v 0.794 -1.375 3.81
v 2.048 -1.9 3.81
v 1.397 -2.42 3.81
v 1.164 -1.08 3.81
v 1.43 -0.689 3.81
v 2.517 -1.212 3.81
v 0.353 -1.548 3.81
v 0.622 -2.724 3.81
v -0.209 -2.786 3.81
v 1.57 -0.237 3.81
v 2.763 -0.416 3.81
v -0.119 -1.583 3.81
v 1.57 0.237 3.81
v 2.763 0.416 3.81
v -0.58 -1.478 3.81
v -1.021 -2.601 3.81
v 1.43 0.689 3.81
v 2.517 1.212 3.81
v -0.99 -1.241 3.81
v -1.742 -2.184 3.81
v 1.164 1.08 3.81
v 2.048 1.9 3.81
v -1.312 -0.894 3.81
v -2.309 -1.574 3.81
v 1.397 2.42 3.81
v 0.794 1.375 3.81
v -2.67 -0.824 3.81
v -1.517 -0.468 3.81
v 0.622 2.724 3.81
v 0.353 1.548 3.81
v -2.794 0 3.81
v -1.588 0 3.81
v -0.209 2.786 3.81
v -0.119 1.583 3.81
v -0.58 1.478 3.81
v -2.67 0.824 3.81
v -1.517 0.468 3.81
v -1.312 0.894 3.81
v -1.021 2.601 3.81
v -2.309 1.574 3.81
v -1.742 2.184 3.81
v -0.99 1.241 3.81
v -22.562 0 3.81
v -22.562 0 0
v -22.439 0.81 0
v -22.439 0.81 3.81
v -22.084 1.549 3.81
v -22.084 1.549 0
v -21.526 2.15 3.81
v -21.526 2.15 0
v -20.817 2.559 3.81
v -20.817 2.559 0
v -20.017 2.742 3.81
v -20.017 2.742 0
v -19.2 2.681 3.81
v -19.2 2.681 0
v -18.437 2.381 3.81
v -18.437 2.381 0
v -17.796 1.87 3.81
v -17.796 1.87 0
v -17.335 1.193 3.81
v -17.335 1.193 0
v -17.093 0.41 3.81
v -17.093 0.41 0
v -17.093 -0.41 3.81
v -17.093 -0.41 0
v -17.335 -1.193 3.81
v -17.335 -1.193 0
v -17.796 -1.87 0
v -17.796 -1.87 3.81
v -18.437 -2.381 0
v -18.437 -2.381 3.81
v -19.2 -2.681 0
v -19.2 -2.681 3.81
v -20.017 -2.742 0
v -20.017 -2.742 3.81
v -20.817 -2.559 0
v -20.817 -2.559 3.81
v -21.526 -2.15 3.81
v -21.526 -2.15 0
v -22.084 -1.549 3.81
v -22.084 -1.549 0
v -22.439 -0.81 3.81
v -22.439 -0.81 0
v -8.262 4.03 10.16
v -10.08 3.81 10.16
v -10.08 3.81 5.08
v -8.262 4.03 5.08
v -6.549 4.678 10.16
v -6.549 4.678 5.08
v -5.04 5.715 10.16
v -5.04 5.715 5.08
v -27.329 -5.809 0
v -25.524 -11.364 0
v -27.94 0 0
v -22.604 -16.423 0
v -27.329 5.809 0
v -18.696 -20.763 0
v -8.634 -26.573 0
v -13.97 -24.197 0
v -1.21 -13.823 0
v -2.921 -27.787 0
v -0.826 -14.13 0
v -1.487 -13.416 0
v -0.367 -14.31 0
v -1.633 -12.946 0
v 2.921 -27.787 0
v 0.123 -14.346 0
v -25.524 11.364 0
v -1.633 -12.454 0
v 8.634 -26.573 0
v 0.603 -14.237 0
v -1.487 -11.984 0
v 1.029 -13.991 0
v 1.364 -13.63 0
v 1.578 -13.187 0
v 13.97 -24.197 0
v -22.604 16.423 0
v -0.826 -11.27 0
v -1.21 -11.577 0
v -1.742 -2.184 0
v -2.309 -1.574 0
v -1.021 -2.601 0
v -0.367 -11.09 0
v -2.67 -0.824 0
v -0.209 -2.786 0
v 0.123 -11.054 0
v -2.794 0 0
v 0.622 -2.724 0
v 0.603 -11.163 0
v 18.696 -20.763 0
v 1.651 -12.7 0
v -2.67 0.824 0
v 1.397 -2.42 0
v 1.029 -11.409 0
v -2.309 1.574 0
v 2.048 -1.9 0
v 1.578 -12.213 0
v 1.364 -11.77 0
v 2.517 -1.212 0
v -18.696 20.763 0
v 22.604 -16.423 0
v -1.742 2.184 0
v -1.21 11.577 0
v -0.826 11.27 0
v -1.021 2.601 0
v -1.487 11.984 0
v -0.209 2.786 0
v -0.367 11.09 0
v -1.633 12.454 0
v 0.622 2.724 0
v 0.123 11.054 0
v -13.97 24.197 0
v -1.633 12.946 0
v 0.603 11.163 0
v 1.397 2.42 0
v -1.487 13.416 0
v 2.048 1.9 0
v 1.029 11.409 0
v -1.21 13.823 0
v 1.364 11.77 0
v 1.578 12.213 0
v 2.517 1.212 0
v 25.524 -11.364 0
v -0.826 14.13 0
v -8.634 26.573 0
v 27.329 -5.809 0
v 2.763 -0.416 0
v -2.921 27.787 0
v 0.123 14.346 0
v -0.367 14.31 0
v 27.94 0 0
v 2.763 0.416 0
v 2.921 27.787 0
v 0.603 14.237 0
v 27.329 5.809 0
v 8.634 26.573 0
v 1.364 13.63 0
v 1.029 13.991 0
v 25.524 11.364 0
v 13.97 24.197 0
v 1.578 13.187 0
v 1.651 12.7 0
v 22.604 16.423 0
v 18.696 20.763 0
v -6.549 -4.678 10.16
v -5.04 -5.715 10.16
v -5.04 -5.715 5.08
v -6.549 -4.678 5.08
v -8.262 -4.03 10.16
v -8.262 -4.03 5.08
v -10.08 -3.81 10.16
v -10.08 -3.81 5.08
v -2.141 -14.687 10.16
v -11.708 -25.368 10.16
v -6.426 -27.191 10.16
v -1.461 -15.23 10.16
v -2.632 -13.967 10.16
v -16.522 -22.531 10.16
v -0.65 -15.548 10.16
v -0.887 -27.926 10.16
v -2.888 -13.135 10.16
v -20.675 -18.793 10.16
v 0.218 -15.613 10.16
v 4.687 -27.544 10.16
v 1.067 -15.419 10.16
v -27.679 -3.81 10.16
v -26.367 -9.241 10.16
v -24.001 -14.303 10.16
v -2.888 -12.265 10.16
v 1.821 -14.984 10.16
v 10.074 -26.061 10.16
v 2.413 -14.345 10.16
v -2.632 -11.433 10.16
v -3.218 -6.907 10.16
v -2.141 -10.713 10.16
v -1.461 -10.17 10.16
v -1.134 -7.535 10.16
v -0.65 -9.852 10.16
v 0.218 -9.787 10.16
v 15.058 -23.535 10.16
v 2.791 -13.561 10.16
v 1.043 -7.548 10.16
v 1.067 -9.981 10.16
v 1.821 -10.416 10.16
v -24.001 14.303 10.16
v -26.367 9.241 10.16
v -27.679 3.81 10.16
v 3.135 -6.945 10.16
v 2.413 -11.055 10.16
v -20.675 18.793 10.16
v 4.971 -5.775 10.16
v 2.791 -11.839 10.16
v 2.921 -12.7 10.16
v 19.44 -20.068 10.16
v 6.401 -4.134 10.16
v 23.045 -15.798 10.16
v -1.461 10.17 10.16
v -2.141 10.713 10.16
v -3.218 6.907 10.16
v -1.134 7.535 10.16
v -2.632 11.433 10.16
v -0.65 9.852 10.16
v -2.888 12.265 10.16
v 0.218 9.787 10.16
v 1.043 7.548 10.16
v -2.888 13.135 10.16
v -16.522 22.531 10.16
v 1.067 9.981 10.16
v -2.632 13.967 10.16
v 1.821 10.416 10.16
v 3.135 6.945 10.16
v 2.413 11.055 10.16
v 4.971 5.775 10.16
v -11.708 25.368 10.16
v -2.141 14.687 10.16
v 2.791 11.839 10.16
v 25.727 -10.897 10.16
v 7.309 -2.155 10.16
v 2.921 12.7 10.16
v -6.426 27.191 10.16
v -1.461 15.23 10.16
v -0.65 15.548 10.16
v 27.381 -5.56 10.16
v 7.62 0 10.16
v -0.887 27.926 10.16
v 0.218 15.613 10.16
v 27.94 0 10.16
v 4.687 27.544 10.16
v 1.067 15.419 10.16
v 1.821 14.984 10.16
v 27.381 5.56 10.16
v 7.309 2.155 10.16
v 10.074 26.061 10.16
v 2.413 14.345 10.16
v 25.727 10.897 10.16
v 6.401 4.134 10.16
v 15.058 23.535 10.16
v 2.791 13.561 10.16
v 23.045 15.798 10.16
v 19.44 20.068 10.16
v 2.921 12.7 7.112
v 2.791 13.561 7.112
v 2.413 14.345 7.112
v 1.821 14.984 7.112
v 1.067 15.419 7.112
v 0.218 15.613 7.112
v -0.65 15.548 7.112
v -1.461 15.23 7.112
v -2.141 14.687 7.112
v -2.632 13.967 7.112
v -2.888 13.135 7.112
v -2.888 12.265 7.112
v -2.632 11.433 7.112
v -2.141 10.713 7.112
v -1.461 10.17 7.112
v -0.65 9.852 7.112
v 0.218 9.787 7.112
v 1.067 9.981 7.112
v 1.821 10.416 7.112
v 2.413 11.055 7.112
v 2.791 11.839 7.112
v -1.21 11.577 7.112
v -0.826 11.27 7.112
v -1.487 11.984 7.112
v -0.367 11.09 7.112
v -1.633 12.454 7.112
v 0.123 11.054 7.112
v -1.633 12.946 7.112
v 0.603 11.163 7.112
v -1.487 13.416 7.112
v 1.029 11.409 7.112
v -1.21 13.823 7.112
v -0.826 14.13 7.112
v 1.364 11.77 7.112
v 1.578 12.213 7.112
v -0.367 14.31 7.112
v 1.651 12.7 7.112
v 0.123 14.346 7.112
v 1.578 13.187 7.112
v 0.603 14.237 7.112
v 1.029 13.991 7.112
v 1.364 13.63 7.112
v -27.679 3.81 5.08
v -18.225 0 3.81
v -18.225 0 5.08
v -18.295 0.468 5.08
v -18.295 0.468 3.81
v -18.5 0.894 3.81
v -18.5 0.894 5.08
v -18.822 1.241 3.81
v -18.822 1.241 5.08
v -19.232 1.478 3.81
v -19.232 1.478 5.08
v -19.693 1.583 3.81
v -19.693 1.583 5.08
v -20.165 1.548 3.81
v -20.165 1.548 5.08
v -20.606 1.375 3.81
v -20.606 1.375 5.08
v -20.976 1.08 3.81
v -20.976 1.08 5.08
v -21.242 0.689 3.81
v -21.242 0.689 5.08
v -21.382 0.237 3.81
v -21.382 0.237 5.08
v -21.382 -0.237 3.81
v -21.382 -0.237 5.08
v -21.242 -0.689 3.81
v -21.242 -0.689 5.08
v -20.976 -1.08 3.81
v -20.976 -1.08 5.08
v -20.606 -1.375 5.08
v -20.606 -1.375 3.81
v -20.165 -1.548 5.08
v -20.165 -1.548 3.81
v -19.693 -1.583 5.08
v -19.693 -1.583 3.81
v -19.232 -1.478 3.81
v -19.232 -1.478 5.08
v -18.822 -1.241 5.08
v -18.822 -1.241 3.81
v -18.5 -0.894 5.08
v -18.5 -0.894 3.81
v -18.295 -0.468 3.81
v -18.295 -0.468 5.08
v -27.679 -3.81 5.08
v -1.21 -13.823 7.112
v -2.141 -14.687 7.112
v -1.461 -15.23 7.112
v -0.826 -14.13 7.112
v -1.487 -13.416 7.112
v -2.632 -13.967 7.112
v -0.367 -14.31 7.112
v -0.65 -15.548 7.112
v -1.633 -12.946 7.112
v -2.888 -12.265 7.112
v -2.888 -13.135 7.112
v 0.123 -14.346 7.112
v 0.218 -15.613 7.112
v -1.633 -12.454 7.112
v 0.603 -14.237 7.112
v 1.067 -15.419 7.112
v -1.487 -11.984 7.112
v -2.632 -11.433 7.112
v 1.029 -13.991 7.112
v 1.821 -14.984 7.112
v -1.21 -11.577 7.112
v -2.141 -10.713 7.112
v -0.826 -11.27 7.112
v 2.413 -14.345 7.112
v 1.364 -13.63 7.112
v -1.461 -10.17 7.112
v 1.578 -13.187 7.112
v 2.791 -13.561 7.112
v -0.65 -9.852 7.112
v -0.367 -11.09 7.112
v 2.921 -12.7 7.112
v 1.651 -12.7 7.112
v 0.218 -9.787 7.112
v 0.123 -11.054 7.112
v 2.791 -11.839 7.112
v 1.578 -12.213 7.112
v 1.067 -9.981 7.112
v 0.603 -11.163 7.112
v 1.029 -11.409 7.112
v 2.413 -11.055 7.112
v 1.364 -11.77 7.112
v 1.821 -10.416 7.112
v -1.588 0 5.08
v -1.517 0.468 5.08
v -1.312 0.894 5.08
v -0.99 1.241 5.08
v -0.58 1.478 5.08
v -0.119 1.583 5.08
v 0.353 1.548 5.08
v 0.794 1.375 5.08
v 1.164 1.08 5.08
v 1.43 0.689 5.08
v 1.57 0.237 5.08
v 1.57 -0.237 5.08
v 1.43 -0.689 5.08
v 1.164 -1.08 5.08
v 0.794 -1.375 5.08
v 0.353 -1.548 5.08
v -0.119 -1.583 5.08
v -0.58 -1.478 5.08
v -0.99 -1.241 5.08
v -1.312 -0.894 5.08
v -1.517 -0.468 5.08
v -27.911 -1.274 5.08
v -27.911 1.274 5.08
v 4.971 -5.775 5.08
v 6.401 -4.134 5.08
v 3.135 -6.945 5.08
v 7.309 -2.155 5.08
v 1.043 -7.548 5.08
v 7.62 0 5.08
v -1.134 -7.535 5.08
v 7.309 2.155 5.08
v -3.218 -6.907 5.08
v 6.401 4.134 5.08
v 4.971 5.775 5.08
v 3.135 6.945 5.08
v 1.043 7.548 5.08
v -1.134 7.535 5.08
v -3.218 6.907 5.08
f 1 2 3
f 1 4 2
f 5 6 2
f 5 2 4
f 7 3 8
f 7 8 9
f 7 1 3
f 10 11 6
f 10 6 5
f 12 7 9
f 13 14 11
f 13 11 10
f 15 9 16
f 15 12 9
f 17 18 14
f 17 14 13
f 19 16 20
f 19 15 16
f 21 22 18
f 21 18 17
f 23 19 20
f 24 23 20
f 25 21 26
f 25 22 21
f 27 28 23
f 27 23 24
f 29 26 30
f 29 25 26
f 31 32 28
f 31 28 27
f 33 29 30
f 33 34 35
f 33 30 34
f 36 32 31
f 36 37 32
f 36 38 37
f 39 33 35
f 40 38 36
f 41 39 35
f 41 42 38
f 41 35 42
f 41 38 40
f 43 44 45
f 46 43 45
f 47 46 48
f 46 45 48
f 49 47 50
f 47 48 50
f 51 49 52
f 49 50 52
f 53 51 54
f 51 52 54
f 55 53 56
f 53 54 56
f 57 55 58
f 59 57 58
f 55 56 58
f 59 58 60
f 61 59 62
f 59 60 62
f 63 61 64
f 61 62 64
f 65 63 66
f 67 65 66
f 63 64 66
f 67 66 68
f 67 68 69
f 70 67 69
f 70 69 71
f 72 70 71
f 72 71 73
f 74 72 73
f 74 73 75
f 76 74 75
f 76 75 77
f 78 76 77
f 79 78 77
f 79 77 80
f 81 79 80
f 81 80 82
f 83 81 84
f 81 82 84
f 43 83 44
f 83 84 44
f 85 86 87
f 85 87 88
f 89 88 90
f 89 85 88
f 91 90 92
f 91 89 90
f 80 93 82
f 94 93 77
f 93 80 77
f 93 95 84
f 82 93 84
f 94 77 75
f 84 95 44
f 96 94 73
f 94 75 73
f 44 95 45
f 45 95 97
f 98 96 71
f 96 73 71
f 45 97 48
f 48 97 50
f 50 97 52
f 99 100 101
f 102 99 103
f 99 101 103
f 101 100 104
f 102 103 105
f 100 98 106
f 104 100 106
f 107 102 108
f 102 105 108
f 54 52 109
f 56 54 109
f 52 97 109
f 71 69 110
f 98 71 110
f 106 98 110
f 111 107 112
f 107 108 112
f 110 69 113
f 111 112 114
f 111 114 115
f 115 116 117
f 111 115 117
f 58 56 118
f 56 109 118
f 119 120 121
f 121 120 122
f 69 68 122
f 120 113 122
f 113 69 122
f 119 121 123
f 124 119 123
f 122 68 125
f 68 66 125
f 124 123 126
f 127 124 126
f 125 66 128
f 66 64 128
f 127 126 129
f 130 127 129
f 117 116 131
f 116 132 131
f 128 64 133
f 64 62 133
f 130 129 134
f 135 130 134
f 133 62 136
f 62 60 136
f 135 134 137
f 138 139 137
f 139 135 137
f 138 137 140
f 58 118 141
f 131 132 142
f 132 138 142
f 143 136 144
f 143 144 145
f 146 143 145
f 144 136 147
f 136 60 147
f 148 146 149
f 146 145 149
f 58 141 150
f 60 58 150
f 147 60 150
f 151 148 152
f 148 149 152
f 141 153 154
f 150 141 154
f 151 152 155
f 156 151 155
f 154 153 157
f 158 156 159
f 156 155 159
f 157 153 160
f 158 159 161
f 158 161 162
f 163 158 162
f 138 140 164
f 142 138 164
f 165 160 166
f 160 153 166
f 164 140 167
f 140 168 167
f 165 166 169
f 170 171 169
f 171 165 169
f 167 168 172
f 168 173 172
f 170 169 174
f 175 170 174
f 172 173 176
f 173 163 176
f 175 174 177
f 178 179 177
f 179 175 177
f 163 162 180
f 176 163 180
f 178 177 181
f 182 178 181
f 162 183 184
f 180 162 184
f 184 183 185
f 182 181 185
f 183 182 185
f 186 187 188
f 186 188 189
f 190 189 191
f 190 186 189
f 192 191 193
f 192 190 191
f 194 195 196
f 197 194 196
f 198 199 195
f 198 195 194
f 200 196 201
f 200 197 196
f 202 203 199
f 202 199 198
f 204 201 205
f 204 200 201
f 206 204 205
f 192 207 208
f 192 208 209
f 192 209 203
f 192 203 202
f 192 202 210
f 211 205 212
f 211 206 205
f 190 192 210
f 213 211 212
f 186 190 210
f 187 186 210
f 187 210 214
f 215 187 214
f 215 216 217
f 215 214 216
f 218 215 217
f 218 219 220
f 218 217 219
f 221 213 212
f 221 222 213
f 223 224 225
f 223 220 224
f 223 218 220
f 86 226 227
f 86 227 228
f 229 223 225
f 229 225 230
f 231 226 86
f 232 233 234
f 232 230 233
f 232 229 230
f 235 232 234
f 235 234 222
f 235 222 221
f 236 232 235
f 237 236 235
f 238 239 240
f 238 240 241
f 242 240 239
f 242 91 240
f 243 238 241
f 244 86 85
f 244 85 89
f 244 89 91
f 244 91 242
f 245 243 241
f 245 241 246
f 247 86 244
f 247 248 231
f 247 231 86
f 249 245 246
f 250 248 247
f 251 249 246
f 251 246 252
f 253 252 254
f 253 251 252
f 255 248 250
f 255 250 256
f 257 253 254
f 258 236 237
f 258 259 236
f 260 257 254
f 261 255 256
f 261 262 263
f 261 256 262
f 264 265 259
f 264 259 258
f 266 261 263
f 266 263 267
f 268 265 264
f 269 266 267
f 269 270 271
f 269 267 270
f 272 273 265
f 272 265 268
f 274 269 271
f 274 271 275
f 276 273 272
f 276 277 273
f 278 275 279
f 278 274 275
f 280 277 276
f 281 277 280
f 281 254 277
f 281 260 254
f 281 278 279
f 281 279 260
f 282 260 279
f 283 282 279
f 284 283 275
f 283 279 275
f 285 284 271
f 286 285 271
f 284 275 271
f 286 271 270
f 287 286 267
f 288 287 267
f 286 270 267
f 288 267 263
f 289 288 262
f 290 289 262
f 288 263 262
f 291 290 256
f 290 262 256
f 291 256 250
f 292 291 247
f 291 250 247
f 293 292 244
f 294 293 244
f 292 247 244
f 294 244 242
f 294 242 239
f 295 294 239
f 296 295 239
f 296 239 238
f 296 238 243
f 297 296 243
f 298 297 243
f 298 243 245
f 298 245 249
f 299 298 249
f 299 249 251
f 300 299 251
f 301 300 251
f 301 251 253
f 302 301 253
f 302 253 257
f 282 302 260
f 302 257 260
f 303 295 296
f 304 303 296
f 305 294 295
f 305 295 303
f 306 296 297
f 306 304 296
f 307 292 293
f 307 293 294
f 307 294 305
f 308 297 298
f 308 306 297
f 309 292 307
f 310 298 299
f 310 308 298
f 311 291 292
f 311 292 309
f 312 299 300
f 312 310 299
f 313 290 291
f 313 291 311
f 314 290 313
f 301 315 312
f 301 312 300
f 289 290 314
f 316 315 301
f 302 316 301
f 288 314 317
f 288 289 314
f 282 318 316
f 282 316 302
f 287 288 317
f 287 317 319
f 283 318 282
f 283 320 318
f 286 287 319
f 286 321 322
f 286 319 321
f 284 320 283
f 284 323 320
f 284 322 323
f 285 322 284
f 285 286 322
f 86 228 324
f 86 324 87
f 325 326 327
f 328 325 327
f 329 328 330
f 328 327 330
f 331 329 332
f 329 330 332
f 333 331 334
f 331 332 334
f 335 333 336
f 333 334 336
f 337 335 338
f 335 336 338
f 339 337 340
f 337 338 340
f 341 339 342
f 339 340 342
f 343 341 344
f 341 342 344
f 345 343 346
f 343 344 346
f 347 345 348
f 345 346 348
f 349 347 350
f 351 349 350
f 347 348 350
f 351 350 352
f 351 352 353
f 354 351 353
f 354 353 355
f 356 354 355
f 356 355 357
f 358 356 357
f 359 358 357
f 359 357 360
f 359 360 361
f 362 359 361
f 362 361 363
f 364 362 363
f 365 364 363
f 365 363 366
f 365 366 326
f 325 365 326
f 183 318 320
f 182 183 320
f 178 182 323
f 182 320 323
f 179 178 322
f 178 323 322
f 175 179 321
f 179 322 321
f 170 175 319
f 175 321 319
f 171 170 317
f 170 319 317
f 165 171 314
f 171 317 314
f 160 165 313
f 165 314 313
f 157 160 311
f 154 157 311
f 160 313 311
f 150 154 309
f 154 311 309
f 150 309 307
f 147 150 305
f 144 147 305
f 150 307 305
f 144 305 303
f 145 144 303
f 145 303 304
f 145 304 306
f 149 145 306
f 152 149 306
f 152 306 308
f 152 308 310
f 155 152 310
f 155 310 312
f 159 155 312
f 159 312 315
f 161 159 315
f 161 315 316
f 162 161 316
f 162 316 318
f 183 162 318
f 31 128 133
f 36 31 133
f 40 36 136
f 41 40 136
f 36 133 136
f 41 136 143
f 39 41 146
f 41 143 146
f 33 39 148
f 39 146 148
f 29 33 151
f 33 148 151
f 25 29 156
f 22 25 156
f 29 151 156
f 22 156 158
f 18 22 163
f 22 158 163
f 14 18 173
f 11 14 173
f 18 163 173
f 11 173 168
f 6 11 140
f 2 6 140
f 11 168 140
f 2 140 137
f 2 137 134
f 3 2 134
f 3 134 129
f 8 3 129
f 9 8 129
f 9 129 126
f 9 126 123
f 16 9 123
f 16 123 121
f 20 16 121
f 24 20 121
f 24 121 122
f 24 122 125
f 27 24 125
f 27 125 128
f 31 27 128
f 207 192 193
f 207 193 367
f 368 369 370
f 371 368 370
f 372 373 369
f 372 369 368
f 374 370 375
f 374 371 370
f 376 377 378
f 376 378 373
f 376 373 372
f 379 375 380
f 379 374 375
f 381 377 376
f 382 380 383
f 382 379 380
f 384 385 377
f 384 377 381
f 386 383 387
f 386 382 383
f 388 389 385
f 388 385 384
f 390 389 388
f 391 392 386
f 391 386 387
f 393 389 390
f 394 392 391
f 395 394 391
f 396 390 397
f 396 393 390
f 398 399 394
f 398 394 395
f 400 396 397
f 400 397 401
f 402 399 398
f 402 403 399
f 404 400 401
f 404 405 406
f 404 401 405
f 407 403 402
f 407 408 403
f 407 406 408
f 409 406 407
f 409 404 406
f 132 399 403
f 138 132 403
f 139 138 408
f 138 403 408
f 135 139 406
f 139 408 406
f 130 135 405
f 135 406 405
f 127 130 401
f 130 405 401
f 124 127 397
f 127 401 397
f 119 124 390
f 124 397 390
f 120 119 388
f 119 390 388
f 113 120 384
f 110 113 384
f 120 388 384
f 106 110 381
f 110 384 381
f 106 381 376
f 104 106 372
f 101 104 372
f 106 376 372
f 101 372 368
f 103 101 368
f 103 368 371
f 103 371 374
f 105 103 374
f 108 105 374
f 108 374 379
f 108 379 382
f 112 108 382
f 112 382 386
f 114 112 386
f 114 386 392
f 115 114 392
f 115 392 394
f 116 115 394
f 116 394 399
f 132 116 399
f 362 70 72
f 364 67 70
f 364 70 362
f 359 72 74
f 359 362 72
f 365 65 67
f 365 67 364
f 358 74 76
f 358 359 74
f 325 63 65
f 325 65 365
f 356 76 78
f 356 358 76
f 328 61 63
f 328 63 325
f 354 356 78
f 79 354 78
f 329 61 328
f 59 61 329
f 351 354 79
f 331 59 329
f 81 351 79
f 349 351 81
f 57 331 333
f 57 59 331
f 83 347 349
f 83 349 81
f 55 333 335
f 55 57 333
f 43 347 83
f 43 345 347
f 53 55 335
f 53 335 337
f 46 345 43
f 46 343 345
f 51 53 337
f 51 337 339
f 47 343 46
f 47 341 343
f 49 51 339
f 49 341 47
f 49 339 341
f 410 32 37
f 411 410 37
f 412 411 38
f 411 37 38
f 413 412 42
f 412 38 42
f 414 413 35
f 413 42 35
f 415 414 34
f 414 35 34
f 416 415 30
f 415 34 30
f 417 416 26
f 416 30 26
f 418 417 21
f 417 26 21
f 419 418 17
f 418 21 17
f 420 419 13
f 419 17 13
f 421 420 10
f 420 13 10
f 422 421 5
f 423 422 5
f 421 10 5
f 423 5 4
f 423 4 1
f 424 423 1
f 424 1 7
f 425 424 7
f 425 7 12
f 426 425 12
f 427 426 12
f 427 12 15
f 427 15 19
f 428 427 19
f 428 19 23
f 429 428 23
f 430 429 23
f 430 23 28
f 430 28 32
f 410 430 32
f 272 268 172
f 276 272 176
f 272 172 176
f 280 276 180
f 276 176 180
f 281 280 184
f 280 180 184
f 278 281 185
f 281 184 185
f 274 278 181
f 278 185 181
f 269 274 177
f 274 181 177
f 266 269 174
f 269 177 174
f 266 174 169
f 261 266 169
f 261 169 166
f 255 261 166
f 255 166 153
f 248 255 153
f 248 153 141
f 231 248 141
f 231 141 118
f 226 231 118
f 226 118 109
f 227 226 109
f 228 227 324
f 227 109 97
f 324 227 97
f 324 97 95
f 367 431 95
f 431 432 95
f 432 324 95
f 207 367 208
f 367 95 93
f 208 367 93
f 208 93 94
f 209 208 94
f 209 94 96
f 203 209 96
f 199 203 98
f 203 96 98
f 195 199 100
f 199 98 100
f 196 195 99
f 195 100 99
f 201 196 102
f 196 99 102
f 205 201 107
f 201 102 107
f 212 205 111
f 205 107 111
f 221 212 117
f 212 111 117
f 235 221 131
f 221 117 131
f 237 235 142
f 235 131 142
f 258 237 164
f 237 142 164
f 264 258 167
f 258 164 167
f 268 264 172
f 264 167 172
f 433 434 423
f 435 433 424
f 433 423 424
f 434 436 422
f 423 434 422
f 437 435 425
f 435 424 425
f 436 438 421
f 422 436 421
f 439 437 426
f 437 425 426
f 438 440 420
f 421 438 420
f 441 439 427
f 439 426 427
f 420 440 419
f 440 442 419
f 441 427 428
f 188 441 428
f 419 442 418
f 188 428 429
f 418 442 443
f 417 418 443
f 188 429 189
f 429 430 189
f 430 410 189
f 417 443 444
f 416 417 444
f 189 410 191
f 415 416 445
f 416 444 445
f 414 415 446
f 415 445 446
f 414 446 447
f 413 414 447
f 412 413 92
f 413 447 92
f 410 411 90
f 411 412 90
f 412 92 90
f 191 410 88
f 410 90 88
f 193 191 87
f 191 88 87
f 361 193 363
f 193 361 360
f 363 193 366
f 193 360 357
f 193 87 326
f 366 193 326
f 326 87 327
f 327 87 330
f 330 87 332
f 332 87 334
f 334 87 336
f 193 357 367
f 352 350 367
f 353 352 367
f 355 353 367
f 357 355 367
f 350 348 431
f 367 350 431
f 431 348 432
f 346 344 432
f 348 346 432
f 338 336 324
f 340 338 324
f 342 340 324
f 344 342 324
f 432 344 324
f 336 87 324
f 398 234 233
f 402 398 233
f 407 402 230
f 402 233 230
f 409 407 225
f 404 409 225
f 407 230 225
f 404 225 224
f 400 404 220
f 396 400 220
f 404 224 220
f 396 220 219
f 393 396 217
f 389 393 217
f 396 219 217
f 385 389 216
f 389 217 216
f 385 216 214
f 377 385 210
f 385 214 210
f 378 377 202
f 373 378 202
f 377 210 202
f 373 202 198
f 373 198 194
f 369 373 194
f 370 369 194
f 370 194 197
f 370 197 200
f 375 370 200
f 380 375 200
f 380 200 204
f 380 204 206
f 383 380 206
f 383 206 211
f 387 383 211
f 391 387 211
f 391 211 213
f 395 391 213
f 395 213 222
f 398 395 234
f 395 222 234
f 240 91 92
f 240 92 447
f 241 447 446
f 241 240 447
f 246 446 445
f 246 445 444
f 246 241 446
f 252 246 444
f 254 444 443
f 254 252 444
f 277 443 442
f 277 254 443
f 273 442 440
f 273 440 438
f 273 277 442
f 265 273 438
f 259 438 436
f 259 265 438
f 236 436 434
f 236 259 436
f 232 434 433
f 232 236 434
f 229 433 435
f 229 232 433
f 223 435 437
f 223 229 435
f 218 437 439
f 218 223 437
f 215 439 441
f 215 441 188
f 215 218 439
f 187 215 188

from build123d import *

# Parameters (mm, degrees)
SKETCH3_R                = 7.408333333
BOSS_EXTRUDE1_DEPTH      = 7.62
CUT_EXTRUDE1_START       = -8.62
CUT_EXTRUDE1_DEPTH       = 9.62
FILLET1_R                = 0.355076163
CIRPATTERN1_COUNT        = 12
FILLET1_OF_CIRPATTERN1_R = 0.355076163
SCALE1_SCALE             = 2.5
SKETCH10_R               = 27.94
BOSS_EXTRUDE4_DEPTH      = 10.16
SKETCH11_R               = 5.08
CUT_EXTRUDE5_DEPTH       = 30.21
CUT_EXTRUDE6_DEPTH       = 5.08
SKETCH13_R               = 1.5875
CUT_EXTRUDE12_DEPTH      = 25.1300001
SKETCH16_R               = 2.74955
CUT_EXTRUDE13_DEPTH      = 3.81
SKETCH18_R               = 5.08
BOSS_EXTRUDE5_DEPTH      = 24.13
SKETCH19_R               = 2.794
CUT_EXTRUDE14_DEPTH      = 22.86
SKETCH20_R               = 1.5875
CUT_EXTRUDE15_DEPTH      = 7.62
SKETCH21_R               = 26.202104712
GEAR_CUT_EXTRUDE_DEPTH   = 19.05
SKETCH22_R               = 1.651
CUT_EXTRUDE17_DEPTH      = 10.16
SKETCH23_R               = 2.921
CUT_EXTRUDE18_DEPTH      = 3.048


with BuildPart() as part:
    # Sketch3 → Boss-Extrude1 (new body)
    with BuildSketch(Plane.XY):
        Circle(SKETCH3_R)
    extrude(amount=-BOSS_EXTRUDE1_DEPTH)

    # Sketch4 → Cut-Extrude1 (cut)
    with BuildSketch(Plane.XY.offset(CUT_EXTRUDE1_START)):
        with BuildLine():
            Line((4.993301754, 0.581811335), (5.926950078, 0.690598508))
            add(Edge.make_bspline(
                [(5.926950078, 0.690598508), (5.929318191, 0.690911872), (5.935944647, 0.691904892), (5.948407954, 0.694232443), (5.96863478, 0.69866684), (5.994230847, 0.70524939), (6.027084964, 0.714822349), (6.065467787, 0.727462413), (6.107282331, 0.74277265), (6.152345854, 0.760950457), (6.196898763, 0.780422108), (6.240942495, 0.801081108), (6.284441008, 0.822769247), (6.336662498, 0.8503395), (6.398612769, 0.885198626), (6.469984516, 0.92853373), (6.54965538, 0.980716028), (6.629400976, 1.037091207), (6.706647925, 1.095172788), (6.78320647, 1.156800213), (6.856219389, 1.218511327), (6.930432721, 1.285554849), (6.998115798, 1.348944008), (7.07205666, 1.423150182), (7.131183599, 1.483972917), (7.190627906, 1.549410219), (7.219315962, 1.581641114), (7.233873511, 1.598273068)],
                knots=[0, 0, 0, 0, 0, 0.005376749, 0.015083688, 0.02853182, 0.046610139, 0.064854849, 0.092110525, 0.119476176, 0.146842496, 0.174208854, 0.201574956, 0.228941013, 0.256307345, 0.307035032, 0.361767352, 0.416499661, 0.471231937, 0.525964282, 0.580696615, 0.635428982, 0.690161387, 0.744893688, 0.799626082, 0.854358408, 0.909090915, 0.909090915, 0.909090915, 0.909090915, 0.909090915], degree=4))
            ThreePointArc((7.233873511, 1.598273068), (7.408333333, 0), (7.233873511, -1.598273068))
            add(Edge.make_bspline(
                [(5.926950078, -0.690598508), (5.929318191, -0.690911872), (5.935944647, -0.691904892), (5.948407954, -0.694232443), (5.96863478, -0.69866684), (5.994230847, -0.70524939), (6.027084964, -0.714822349), (6.065467787, -0.727462413), (6.107282331, -0.74277265), (6.152345854, -0.760950457), (6.196898763, -0.780422108), (6.240942495, -0.801081108), (6.284441008, -0.822769247), (6.336662498, -0.8503395), (6.398612769, -0.885198626), (6.469984516, -0.92853373), (6.54965538, -0.980716028), (6.629400976, -1.037091207), (6.706647925, -1.095172788), (6.78320647, -1.156800213), (6.856219389, -1.218511327), (6.930432721, -1.285554849), (6.998115798, -1.348944008), (7.07205666, -1.423150182), (7.131183599, -1.483972917), (7.190627906, -1.549410219), (7.219315962, -1.581641114), (7.233873511, -1.598273068)],
                knots=[0, 0, 0, 0, 0, 0.005376749, 0.015083688, 0.02853182, 0.046610139, 0.064854849, 0.092110525, 0.119476176, 0.146842496, 0.174208854, 0.201574956, 0.228941013, 0.256307345, 0.307035032, 0.361767352, 0.416499661, 0.471231937, 0.525964282, 0.580696615, 0.635428982, 0.690161387, 0.744893688, 0.799626082, 0.854358408, 0.909090915, 0.909090915, 0.909090915, 0.909090915, 0.909090915], degree=4))
            Line((5.926950078, -0.690598508), (4.993301754, -0.581811335))
            ThreePointArc((4.993301754, -0.581811335), (5.027083333, 0), (4.993301754, 0.581811335))
        make_face()
    cut_extrude1 = extrude(amount=CUT_EXTRUDE1_DEPTH, mode=Mode.SUBTRACT)

    # Fillet1
    fillet1_edges = [part.edges().sort_by_distance(p)[0] for p in [
        (4.993301754, -0.581811335, -3.81),
        (4.993301754, 0.581811335, -3.81),
    ]]
    fillet(fillet1_edges, radius=FILLET1_R)

    # CirPattern1: Cut-Extrude1 ×12 about axis
    cirpattern1_axis = Axis((0, 0, 6.35), (0, 0, -1))
    for i in range(1, CIRPATTERN1_COUNT):
        add(cut_extrude1.rotate(cirpattern1_axis, i * 360 / CIRPATTERN1_COUNT), mode=Mode.SUBTRACT)

    # Fillet1 of CirPattern1
    fillet1_of_cirpattern1_edges = [part.edges().sort_by_distance(p)[0] for p in [
        (4.0334205, -3.000514274, -3.81),
        (4.615231836, -1.99278748, -3.81),
        (1.99278748, -4.615231836, -3.81),
        (3.000514274, -4.0334205, -3.81),
        (-0.581811335, -4.993301754, -3.81),
        (0.581811335, -4.993301754, -3.81),
        (-3.000514274, -4.0334205, -3.81),
        (-1.99278748, -4.615231836, -3.81),
        (-4.615231836, -1.99278748, -3.81),
        (-4.0334205, -3.000514274, -3.81),
        (-4.993301754, 0.581811335, -3.81),
        (-4.993301754, -0.581811335, -3.81),
        (-4.0334205, 3.000514274, -3.81),
        (-4.615231836, 1.99278748, -3.81),
        (-1.99278748, 4.615231836, -3.81),
        (-3.000514274, 4.0334205, -3.81),
        (0.581811335, 4.993301754, -3.81),
        (-0.581811335, 4.993301754, -3.81),
        (3.000514274, 4.0334205, -3.81),
        (1.99278748, 4.615231836, -3.81),
        (4.615231836, 1.99278748, -3.81),
        (4.0334205, 3.000514274, -3.81),
    ]]
    fillet(fillet1_of_cirpattern1_edges, radius=FILLET1_OF_CIRPATTERN1_R)


with BuildPart() as part_1:
    # Scale1: scaled about (0, 0, 0)
    add(part.part.scale(SCALE1_SCALE))

    # Sketch10 → Boss-Extrude4 (add)
    with BuildSketch(Plane.XY):
        Circle(SKETCH10_R)
    extrude(amount=BOSS_EXTRUDE4_DEPTH)

    # Sketch11 → Cut-Extrude5 (cut, through all)
    with BuildSketch(Plane(origin=(0, 0, -19.05), x_dir=(-1, 0, 0), z_dir=(0, 0, -1))):
        Circle(SKETCH11_R)
    extrude(amount=-CUT_EXTRUDE5_DEPTH, mode=Mode.SUBTRACT)

    # Sketch12 → Cut-Extrude6 (cut)
    with BuildSketch(Plane.XY.offset(10.16)):
        with BuildLine():
            Line((-10.080312495, -3.81), (-28.438556916, -3.81))
            Line((-28.438556916, -3.81), (-28.438556916, 3.81))
            Line((-28.438556916, 3.81), (-10.080312495, 3.81))
            ThreePointArc((-10.080312495, 3.81), (-7.386235659, 4.302142678), (-5.040156248, 5.715))
            ThreePointArc((-5.040156248, 5.715), (7.62, 0), (-5.040156248, -5.715))
            ThreePointArc((-5.040156248, -5.715), (-7.386235659, -4.302142678), (-10.080312495, -3.81))
        make_face()
    extrude(amount=-CUT_EXTRUDE6_DEPTH, mode=Mode.SUBTRACT)

    # Sketch13 → Cut-Extrude12 (cut, through all)
    with BuildSketch(Plane.XY.offset(5.08)):
        with Locations((-19.812, 0)):
            Circle(SKETCH13_R)
    extrude(amount=-CUT_EXTRUDE12_DEPTH, mode=Mode.SUBTRACT)

    # Sketch16 → Cut-Extrude13 (cut)
    with BuildSketch(Plane(origin=(0, 0, 0), x_dir=(-1, 0, 0), z_dir=(0, 0, -1))):
        with Locations((19.812, 0)):
            Circle(SKETCH16_R)
    extrude(amount=-CUT_EXTRUDE13_DEPTH, mode=Mode.SUBTRACT)

    # Sketch18 → Boss-Extrude5 (add)
    with BuildSketch(Plane(origin=(0, 0, -19.05), x_dir=(-1, 0, 0), z_dir=(0, 0, -1))):
        Circle(SKETCH18_R)
    extrude(amount=-BOSS_EXTRUDE5_DEPTH)

    # Sketch19 → Cut-Extrude14 (cut)
    with BuildSketch(Plane(origin=(0, 0, -19.05), x_dir=(-1, 0, 0), z_dir=(0, 0, -1))):
        Circle(SKETCH19_R)
    extrude(amount=-CUT_EXTRUDE14_DEPTH, mode=Mode.SUBTRACT)

    # Sketch20 → Cut-Extrude15 (cut)
    with BuildSketch(Plane(origin=(0, 0, 3.81), x_dir=(-1, 0, 0), z_dir=(0, 0, -1))):
        Circle(SKETCH20_R)
    extrude(amount=-CUT_EXTRUDE15_DEPTH, mode=Mode.SUBTRACT)

    # Sketch21 → Gear Cut Extrude (cut)
    with BuildSketch(Plane(origin=(0, 0, -19.05), x_dir=(-1, 0, 0), z_dir=(0, 0, -1))):
        Circle(SKETCH21_R)
    extrude(amount=-GEAR_CUT_EXTRUDE_DEPTH, mode=Mode.SUBTRACT)

    # Sketch22 → Cut-Extrude17 (cut)
    with BuildSketch(Plane.XY.offset(10.16)):
        with Locations((0, 12.7)):
            Circle(SKETCH22_R)
        with Locations((0, -12.7)):
            Circle(SKETCH22_R)
    extrude(amount=-CUT_EXTRUDE17_DEPTH, mode=Mode.SUBTRACT)

    # Sketch23 → Cut-Extrude18 (cut)
    with BuildSketch(Plane.XY.offset(10.16)):
        with Locations((0, -12.7)):
            Circle(SKETCH23_R)
        with Locations((0, 12.7)):
            Circle(SKETCH23_R)
    extrude(amount=-CUT_EXTRUDE18_DEPTH, mode=Mode.SUBTRACT)


solid = part_1.part
